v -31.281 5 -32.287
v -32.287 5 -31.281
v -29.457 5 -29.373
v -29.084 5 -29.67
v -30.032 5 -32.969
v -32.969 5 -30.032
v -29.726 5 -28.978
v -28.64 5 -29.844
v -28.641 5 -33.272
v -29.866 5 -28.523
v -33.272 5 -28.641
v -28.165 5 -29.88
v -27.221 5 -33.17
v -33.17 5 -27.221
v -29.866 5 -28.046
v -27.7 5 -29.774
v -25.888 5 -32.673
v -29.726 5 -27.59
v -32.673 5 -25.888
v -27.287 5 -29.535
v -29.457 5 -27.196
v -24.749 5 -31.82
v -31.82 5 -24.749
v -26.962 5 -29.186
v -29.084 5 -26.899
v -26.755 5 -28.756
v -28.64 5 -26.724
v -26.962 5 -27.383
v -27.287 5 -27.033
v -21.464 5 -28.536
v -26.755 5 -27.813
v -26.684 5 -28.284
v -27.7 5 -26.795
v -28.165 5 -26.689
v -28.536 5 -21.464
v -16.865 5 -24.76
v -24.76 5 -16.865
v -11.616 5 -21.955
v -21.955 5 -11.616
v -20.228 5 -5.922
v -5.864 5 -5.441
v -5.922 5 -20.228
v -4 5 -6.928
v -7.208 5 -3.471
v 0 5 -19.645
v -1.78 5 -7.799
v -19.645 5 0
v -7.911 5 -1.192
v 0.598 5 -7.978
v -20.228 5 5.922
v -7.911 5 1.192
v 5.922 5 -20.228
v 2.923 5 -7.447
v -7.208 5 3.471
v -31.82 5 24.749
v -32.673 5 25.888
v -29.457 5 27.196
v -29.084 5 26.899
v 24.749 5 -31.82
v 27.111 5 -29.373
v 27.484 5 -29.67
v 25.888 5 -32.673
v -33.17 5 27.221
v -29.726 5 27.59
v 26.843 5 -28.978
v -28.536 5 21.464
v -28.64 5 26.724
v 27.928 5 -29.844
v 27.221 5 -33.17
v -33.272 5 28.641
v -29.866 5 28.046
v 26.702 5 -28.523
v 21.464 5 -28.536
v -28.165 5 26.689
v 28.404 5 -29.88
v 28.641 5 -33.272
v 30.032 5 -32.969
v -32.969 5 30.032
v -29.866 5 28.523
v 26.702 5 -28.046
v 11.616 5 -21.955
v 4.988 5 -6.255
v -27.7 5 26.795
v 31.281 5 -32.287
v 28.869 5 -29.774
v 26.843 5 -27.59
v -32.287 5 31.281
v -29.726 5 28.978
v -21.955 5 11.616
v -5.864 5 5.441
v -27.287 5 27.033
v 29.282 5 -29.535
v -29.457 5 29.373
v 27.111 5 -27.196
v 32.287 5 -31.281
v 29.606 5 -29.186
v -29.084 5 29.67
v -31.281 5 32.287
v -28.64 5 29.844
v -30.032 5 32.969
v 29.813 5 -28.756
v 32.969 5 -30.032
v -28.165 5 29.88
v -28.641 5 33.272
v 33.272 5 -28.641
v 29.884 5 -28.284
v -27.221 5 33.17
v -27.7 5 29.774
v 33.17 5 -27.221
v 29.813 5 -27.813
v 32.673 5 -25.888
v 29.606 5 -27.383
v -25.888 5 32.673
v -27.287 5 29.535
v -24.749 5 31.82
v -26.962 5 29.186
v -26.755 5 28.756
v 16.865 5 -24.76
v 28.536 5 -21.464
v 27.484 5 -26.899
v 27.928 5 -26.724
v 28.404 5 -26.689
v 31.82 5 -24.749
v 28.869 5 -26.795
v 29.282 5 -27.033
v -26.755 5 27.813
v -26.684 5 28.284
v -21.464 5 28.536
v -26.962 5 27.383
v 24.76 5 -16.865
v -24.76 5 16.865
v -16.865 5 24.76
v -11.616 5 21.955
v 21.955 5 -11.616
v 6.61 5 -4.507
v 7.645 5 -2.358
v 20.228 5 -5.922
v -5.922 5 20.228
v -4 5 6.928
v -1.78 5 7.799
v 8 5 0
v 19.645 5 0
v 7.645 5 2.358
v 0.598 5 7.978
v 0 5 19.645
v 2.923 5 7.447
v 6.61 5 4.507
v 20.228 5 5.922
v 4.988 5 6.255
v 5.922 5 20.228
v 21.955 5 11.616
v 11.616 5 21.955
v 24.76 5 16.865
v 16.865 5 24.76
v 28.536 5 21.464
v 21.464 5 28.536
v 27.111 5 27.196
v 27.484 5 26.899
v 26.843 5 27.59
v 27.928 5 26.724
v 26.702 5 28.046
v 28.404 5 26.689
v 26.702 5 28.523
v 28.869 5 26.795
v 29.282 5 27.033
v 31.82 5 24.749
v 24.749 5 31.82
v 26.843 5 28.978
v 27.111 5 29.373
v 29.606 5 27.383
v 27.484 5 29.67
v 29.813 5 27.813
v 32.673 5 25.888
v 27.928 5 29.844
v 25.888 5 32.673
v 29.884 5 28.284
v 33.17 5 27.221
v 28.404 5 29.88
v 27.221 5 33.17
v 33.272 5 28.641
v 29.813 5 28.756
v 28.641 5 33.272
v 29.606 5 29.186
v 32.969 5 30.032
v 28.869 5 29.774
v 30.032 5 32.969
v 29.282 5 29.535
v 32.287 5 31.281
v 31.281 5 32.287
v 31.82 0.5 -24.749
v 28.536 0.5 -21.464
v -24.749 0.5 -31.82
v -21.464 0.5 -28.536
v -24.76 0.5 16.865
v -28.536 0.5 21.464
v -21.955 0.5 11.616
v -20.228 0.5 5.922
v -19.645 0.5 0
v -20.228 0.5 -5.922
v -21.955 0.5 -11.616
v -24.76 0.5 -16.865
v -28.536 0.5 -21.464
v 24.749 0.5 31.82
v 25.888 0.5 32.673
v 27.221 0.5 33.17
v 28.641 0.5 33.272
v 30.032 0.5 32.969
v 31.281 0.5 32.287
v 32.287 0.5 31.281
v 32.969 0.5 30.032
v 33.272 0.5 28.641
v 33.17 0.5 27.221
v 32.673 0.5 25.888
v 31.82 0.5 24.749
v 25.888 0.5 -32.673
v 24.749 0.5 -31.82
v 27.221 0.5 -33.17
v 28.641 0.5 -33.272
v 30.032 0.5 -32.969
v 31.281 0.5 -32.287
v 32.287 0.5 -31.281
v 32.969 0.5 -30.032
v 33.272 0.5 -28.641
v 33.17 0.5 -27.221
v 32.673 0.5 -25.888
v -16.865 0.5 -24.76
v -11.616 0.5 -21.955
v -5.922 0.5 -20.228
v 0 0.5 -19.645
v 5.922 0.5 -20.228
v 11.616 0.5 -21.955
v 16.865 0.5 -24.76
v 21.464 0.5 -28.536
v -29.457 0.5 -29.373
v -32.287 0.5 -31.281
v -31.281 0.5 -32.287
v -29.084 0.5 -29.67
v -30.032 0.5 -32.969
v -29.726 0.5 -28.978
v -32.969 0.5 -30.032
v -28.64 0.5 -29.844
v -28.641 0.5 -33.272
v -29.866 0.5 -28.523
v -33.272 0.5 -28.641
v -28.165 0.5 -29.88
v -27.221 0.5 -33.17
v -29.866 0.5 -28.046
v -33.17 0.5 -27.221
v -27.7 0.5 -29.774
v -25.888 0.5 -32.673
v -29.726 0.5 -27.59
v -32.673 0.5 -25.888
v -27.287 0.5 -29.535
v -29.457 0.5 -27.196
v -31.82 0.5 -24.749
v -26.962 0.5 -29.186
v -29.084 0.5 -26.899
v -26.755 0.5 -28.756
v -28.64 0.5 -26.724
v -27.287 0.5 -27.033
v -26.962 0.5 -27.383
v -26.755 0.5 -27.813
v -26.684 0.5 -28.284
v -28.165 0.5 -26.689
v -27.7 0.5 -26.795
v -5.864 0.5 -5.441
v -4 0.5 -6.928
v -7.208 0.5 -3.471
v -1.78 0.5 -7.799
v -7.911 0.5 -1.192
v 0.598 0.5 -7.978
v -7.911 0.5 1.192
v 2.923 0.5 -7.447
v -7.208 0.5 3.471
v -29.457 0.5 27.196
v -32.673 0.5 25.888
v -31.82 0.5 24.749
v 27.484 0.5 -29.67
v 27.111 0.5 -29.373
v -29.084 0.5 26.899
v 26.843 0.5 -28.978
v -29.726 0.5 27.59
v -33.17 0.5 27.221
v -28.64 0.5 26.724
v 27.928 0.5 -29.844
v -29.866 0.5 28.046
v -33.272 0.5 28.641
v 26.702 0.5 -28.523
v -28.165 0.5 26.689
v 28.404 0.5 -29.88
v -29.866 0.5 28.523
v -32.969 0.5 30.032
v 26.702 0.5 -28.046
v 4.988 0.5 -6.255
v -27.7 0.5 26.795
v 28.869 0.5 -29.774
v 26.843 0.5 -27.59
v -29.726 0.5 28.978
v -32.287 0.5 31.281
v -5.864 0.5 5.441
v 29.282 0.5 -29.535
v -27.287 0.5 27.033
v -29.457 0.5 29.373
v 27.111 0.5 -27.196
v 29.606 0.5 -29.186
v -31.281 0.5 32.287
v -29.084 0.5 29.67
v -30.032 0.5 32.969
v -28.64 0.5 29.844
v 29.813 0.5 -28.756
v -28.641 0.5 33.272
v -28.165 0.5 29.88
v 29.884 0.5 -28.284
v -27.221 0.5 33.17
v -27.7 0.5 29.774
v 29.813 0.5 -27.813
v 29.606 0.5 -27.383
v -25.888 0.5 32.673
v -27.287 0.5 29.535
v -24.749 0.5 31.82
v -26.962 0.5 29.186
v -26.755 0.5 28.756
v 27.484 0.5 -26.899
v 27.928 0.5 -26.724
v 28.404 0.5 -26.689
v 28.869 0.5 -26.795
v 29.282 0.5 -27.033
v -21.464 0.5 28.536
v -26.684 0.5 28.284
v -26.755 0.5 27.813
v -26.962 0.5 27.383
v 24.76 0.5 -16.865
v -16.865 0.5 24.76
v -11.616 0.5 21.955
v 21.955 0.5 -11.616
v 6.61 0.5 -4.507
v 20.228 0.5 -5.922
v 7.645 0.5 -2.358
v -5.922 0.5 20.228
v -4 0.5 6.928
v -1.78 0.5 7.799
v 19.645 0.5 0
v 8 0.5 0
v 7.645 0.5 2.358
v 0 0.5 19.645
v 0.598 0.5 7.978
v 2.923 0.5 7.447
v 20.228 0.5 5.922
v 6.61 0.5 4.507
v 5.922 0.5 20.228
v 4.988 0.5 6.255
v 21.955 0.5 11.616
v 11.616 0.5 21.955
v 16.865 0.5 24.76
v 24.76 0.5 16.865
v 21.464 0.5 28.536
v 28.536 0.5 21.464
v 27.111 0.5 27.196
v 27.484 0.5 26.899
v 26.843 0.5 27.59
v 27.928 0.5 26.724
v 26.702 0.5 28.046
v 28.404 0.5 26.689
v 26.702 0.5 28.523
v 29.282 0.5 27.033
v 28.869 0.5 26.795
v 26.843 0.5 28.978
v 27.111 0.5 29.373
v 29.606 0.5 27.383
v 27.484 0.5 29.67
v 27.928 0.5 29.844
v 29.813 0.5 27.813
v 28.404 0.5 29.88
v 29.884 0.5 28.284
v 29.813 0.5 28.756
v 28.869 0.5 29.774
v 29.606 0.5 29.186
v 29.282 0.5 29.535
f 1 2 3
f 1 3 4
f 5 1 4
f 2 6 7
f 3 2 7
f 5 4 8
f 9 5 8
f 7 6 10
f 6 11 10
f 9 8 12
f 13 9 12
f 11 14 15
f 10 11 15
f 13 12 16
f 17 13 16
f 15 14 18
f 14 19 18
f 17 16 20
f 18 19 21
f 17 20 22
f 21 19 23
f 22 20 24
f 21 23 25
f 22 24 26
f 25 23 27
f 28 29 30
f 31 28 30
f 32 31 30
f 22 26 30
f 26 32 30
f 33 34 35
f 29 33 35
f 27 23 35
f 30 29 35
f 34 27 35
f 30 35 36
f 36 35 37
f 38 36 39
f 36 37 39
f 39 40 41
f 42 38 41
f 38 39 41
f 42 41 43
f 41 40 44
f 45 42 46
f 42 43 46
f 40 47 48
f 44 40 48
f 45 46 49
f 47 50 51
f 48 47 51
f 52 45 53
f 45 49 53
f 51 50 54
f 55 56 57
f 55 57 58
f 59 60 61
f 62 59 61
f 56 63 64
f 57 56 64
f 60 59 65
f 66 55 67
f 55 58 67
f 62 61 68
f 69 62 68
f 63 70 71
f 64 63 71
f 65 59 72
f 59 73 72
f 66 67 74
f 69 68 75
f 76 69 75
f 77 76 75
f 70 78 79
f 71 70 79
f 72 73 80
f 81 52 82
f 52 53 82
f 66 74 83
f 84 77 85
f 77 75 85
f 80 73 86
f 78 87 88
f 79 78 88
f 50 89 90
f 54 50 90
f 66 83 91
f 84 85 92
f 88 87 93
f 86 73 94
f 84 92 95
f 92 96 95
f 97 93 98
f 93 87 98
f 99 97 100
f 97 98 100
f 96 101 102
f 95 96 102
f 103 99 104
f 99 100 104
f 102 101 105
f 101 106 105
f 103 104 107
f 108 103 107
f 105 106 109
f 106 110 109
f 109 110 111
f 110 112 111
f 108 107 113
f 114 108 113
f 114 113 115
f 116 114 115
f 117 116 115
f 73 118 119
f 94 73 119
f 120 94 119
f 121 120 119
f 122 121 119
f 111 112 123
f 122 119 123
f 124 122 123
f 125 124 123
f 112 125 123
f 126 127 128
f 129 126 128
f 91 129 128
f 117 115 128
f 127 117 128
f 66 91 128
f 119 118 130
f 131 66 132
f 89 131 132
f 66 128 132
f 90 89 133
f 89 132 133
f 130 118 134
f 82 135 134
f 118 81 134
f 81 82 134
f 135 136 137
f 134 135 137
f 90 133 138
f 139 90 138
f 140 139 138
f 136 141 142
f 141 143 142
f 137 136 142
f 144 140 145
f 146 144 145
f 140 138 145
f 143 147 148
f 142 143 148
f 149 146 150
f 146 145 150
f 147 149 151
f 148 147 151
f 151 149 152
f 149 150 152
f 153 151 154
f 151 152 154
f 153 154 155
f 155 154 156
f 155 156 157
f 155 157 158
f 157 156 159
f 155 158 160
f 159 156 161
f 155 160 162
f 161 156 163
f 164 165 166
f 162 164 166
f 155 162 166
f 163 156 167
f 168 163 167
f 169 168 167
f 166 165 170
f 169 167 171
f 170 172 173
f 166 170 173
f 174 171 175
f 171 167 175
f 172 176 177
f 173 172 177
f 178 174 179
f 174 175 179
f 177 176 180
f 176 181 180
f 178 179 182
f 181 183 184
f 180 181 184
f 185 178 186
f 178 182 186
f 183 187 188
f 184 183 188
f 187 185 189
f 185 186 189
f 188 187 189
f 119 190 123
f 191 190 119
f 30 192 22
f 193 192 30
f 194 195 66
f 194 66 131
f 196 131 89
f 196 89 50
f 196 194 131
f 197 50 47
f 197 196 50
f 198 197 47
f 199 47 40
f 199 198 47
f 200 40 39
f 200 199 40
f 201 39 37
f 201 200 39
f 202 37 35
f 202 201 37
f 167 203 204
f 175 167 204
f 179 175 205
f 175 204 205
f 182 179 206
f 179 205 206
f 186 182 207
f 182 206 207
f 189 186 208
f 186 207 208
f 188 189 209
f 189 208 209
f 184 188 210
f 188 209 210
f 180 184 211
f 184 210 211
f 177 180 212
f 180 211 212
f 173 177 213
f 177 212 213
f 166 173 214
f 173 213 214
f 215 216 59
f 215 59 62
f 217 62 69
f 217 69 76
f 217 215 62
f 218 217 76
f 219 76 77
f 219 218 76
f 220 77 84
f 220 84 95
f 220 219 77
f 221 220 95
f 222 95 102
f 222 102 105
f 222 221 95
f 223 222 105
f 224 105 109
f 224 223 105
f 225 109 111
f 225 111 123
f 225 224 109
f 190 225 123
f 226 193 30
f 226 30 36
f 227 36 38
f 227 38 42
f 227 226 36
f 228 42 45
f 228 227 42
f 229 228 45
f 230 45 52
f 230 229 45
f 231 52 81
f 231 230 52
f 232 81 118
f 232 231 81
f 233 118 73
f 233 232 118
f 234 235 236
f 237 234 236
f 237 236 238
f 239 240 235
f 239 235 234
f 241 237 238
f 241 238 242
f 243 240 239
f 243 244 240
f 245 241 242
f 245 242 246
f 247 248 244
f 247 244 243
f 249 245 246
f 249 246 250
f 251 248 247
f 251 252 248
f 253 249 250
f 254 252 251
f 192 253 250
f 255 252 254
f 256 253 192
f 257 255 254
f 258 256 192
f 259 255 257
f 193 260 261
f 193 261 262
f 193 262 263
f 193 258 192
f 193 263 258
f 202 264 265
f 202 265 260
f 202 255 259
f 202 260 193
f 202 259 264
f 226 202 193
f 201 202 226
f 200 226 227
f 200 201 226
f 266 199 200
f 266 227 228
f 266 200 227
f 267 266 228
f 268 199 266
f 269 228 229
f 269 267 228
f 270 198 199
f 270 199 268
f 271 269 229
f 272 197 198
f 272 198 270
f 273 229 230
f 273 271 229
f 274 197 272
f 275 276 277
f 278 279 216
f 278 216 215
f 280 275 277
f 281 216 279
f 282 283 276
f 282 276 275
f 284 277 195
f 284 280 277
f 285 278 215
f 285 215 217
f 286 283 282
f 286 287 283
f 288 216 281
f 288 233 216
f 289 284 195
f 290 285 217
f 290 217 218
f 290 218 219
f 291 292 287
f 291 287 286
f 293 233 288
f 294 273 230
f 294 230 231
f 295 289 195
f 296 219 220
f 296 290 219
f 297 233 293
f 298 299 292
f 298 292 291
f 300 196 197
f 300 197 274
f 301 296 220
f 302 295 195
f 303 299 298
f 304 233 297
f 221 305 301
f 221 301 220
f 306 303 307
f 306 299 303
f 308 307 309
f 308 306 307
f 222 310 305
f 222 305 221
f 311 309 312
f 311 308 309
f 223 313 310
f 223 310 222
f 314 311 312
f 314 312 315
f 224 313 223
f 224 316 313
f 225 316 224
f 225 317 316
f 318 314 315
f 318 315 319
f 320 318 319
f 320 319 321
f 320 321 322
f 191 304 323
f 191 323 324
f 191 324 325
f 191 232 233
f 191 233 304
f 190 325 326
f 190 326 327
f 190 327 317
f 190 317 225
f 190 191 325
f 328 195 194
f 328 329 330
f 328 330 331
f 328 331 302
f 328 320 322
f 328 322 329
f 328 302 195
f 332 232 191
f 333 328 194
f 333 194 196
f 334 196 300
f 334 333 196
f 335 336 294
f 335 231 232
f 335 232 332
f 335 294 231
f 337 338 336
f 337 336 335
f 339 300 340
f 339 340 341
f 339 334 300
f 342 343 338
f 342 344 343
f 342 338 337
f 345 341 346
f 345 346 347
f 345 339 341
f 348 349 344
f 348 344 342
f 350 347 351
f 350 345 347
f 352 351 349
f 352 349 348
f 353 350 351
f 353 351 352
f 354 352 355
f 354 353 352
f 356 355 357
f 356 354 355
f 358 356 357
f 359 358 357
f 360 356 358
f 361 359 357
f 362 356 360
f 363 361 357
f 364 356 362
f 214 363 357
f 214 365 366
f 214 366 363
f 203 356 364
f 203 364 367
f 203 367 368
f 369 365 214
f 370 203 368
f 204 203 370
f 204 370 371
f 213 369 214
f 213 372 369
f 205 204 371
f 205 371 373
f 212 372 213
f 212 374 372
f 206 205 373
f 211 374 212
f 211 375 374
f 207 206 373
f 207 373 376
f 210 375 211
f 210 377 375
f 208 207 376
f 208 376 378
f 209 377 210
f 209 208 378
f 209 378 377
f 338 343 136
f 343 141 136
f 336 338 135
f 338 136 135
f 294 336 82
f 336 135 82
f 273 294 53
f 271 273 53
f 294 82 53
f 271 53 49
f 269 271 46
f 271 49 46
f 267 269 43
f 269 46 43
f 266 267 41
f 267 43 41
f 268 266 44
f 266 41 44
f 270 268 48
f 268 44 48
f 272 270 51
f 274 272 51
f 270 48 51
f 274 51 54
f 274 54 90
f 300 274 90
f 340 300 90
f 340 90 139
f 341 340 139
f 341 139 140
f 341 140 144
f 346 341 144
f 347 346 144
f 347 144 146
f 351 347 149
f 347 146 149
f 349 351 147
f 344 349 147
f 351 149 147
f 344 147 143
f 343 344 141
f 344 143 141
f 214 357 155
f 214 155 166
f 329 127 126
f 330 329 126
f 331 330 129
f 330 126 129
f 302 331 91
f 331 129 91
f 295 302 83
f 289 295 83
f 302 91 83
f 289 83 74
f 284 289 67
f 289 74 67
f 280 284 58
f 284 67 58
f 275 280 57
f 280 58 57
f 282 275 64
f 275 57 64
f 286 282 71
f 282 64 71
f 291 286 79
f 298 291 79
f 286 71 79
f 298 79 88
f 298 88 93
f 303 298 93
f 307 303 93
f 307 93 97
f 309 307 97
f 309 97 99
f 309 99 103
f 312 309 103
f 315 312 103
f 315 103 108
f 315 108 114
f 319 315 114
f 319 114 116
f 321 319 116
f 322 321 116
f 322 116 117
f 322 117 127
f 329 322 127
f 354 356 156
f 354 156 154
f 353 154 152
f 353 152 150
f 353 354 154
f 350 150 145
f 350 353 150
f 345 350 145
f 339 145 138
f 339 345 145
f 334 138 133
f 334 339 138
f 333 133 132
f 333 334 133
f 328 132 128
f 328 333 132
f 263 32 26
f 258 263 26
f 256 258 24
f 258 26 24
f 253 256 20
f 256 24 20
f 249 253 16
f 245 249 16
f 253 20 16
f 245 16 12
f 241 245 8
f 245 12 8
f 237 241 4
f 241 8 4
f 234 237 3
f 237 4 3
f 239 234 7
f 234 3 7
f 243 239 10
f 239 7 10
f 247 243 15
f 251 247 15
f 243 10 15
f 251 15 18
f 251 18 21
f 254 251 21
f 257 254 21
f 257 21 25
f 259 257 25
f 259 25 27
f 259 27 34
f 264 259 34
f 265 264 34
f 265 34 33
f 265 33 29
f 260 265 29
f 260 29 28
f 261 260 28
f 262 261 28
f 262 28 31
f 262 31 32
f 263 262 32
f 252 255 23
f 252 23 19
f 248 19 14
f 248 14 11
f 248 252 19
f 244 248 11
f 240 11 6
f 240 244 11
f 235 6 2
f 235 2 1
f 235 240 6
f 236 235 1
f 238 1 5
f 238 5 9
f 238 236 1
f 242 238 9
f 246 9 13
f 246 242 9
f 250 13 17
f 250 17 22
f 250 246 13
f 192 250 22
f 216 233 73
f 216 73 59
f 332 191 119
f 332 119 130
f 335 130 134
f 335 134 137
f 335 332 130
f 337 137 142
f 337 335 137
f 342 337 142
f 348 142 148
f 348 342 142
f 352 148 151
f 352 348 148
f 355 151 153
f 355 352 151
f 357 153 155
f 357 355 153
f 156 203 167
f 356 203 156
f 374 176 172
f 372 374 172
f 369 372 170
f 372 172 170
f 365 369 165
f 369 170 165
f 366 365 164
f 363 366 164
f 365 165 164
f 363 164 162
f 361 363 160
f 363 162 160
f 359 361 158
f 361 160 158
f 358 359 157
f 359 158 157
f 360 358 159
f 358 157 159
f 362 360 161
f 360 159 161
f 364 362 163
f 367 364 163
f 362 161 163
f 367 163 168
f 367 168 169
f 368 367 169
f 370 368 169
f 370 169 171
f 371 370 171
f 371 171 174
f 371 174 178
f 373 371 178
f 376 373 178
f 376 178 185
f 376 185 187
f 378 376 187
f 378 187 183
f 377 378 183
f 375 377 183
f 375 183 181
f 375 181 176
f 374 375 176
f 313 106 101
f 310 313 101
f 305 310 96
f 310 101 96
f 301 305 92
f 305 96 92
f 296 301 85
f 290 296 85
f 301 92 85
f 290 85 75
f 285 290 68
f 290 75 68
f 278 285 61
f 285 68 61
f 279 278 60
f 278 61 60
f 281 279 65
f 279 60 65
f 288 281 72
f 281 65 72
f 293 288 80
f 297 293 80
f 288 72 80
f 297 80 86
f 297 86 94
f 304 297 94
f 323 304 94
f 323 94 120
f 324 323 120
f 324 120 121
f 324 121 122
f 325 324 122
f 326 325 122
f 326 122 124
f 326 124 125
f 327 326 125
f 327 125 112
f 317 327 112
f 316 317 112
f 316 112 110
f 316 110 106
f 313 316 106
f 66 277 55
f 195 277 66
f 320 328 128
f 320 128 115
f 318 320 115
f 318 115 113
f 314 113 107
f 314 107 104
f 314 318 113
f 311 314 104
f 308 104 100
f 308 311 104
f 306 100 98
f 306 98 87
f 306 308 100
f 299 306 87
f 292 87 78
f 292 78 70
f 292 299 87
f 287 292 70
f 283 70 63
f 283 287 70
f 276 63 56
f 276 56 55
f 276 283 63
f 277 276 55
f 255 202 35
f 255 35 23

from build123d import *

# Parameters (mm, degrees)
SKETCH_1_W          = 70
SKETCH_1_H          = 70
EXTRUDE_1_DEPTH     = 5
SKETCH_2_R          = 8
CUT_EXTRUDE_1_DEPTH = 2.5
CUT_EXTRUDE_2_REACH = 4.5
SKETCH_3_R          = 6.5
SKETCH_4_W          = 70
SKETCH_4_H          = 70
SKETCH_4_R          = 10
CUT_EXTRUDE_3_DEPTH = 0.5
CUT_EXTRUDE_4_REACH = 7
SKETCH_5_R          = 1.6
CUT_EXTRUDE_6_REACH = 6.5
CUT_EXTRUDE_7_REACH = 6.5
FILLET_1_R          = 10
SKETCH_8_R          = 10
CUT_EXTRUDE_8_DEPTH = 0.5
EXTRUDE_2_DEPTH     = 4.5
CUT_EXTRUDE_9_REACH = 4
SKETCH_10_R         = 8
SKETCH_10_R_2       = 6.5


with BuildPart() as part:
    # 草图1 → 凸台-拉伸1 (new body)
    with BuildSketch(Plane(origin=(0, 0, 0), x_dir=(1, 0, 0), z_dir=(0, 1, 0))):
        Rectangle(SKETCH_1_W, SKETCH_1_H)
    extrude(amount=EXTRUDE_1_DEPTH)

    # 草图2 → 切除-拉伸1 (cut)
    with BuildSketch(Plane(origin=(0, 5, 0), x_dir=(1, 0, 0), z_dir=(0, 1, 0))):
        Circle(SKETCH_2_R)
    extrude(amount=-CUT_EXTRUDE_1_DEPTH, mode=Mode.SUBTRACT)

    # 草图3 → 切除-拉伸2 (cut, up to next)
    with BuildSketch(Plane(origin=(0, 2.5, 0), x_dir=(1, 0, 0), z_dir=(0, 1, 0)), mode=Mode.PRIVATE) as cut_extrude_2_sk1:
        Circle(SKETCH_3_R)
    cut_extrude_2_tool1 = extrude(cut_extrude_2_sk1.sketch, amount=-CUT_EXTRUDE_2_REACH, mode=Mode.PRIVATE) & part.part
    add(cut_extrude_2_tool1.solids().sort_by_distance((0, 2.5, 0))[0], mode=Mode.SUBTRACT)

    # 草图4 → 切除-拉伸3 (cut)
    with BuildSketch(Plane.XZ):
        Rectangle(SKETCH_4_W, SKETCH_4_H)
        Circle(SKETCH_4_R, mode=Mode.SUBTRACT)
    extrude(amount=-CUT_EXTRUDE_3_DEPTH, mode=Mode.SUBTRACT)

    # 草图5 → 切除-拉伸4 (cut, up to next)
    with BuildSketch(Plane(origin=(0, 5, 0), x_dir=(1, 0, 0), z_dir=(0, 1, 0)), mode=Mode.PRIVATE) as cut_extrude_4_sk1:
        with Locations((28.284271247, -28.284271247)):
            Circle(SKETCH_5_R)
    cut_extrude_4_tool1 = extrude(cut_extrude_4_sk1.sketch, amount=-CUT_EXTRUDE_4_REACH, mode=Mode.PRIVATE) & part.part
    add(cut_extrude_4_tool1.solids().sort_by_distance((28.284271, 5, 28.284271))[0], mode=Mode.SUBTRACT)
    # 草图5 → 切除-拉伸4 (cut, up to next)
    with BuildSketch(Plane(origin=(0, 5, 0), x_dir=(1, 0, 0), z_dir=(0, 1, 0)), mode=Mode.PRIVATE) as cut_extrude_4_sk2:
        with Locations((-28.284271247, -28.284271247)):
            Circle(SKETCH_5_R)
    cut_extrude_4_tool2 = extrude(cut_extrude_4_sk2.sketch, amount=-CUT_EXTRUDE_4_REACH, mode=Mode.PRIVATE) & part.part
    add(cut_extrude_4_tool2.solids().sort_by_distance((-28.284271, 5, 28.284271))[0], mode=Mode.SUBTRACT)
    # 草图5 → 切除-拉伸4 (cut, up to next)
    with BuildSketch(Plane(origin=(0, 5, 0), x_dir=(1, 0, 0), z_dir=(0, 1, 0)), mode=Mode.PRIVATE) as cut_extrude_4_sk3:
        with Locations((-28.284271247, 28.284271247)):
            Circle(SKETCH_5_R)
    cut_extrude_4_tool3 = extrude(cut_extrude_4_sk3.sketch, amount=-CUT_EXTRUDE_4_REACH, mode=Mode.PRIVATE) & part.part
    add(cut_extrude_4_tool3.solids().sort_by_distance((-28.284271, 5, -28.284271))[0], mode=Mode.SUBTRACT)
    # 草图5 → 切除-拉伸4 (cut, up to next)
    with BuildSketch(Plane(origin=(0, 5, 0), x_dir=(1, 0, 0), z_dir=(0, 1, 0)), mode=Mode.PRIVATE) as cut_extrude_4_sk4:
        with Locations((28.284271247, 28.284271247)):
            Circle(SKETCH_5_R)
    cut_extrude_4_tool4 = extrude(cut_extrude_4_sk4.sketch, amount=-CUT_EXTRUDE_4_REACH, mode=Mode.PRIVATE) & part.part
    add(cut_extrude_4_tool4.solids().sort_by_distance((28.284271, 5, -28.284271))[0], mode=Mode.SUBTRACT)

    # 草图6 → 切除-拉伸6 (cut, up to next)
    with BuildSketch(Plane.XZ.offset(-0.5), mode=Mode.PRIVATE) as cut_extrude_6_sk1:
        with BuildLine():
            Line((27.928932188, 35), (4.565391967, 11.636459779))
            ThreePointArc((4.565391967, 11.636459779), (0, 12.5), (-4.565391967, 11.636459779))
            Line((-4.565391967, 11.636459779), (-27.928932188, 35))
            Line((-27.928932188, 35), (27.928932188, 35))
        make_face()
    cut_extrude_6_tool1 = extrude(cut_extrude_6_sk1.sketch, amount=-CUT_EXTRUDE_6_REACH, mode=Mode.PRIVATE) & part.part
    add(cut_extrude_6_tool1.solids().sort_by_distance((0, 0.5, 26.217235))[0], mode=Mode.SUBTRACT)
    # 草图6 → 切除-拉伸6 (cut, up to next)
    with BuildSketch(Plane.XZ.offset(-0.5), mode=Mode.PRIVATE) as cut_extrude_6_sk2:
        with BuildLine():
            Line((35, -27.928932188), (11.636459779, -4.565391967))
            ThreePointArc((11.636459779, -4.565391967), (12.5, 0), (11.636459779, 4.565391967))
            Line((11.636459779, 4.565391967), (35, 27.928932188))
            Line((35, 27.928932188), (35, -27.928932188))
        make_face()
    cut_extrude_6_tool2 = extrude(cut_extrude_6_sk2.sketch, amount=-CUT_EXTRUDE_6_REACH, mode=Mode.PRIVATE) & part.part
    add(cut_extrude_6_tool2.solids().sort_by_distance((26.217235, 0.5, 0))[0], mode=Mode.SUBTRACT)
    # 草图6 → 切除-拉伸6 (cut, up to next)
    with BuildSketch(Plane.XZ.offset(-0.5), mode=Mode.PRIVATE) as cut_extrude_6_sk3:
        with BuildLine():
            Line((-27.928932188, -35), (-4.565391967, -11.636459779))
            ThreePointArc((-4.565391967, -11.636459779), (0, -12.5), (4.565391967, -11.636459779))
            Line((4.565391967, -11.636459779), (27.928932188, -35))
            Line((27.928932188, -35), (-27.928932188, -35))
        make_face()
    cut_extrude_6_tool3 = extrude(cut_extrude_6_sk3.sketch, amount=-CUT_EXTRUDE_6_REACH, mode=Mode.PRIVATE) & part.part
    add(cut_extrude_6_tool3.solids().sort_by_distance((0, 0.5, -26.217235))[0], mode=Mode.SUBTRACT)
    # 草图6 → 切除-拉伸6 (cut, up to next)
    with BuildSketch(Plane.XZ.offset(-0.5), mode=Mode.PRIVATE) as cut_extrude_6_sk4:
        with BuildLine():
            Line((-35, 27.928932188), (-11.636459779, 4.565391967))
            ThreePointArc((-11.636459779, 4.565391967), (-12.5, 0), (-11.636459779, -4.565391967))
            Line((-11.636459779, -4.565391967), (-35, -27.928932188))
            Line((-35, -27.928932188), (-35, 27.928932188))
        make_face()
    cut_extrude_6_tool4 = extrude(cut_extrude_6_sk4.sketch, amount=-CUT_EXTRUDE_6_REACH, mode=Mode.PRIVATE) & part.part
    add(cut_extrude_6_tool4.solids().sort_by_distance((-26.217235, 0.5, 0))[0], mode=Mode.SUBTRACT)

    # 草图7 → 切除-拉伸7 (cut, up to next)
    with BuildSketch(Plane.XZ.offset(-0.5), mode=Mode.PRIVATE) as cut_extrude_7_sk1:
        with BuildLine():
            Line((35, 27.928932188), (35, 35))
            Line((35, 35), (27.928932188, 35))
            Line((27.928932188, 35), (24.748737342, 31.819805153))
            ThreePointArc((24.748737342, 31.819805153), (31.819805153, 31.819805153), (31.819805153, 24.748737342))
            Line((31.819805153, 24.748737342), (35, 27.928932188))
        make_face()
    cut_extrude_7_tool1 = extrude(cut_extrude_7_sk1.sketch, amount=-CUT_EXTRUDE_7_REACH, mode=Mode.PRIVATE) & part.part
    add(cut_extrude_7_tool1.solids().sort_by_distance((32.243136, 0.5, 32.243136))[0], mode=Mode.SUBTRACT)
    # 草图7 → 切除-拉伸7 (cut, up to next)
    with BuildSketch(Plane.XZ.offset(-0.5), mode=Mode.PRIVATE) as cut_extrude_7_sk2:
        with BuildLine():
            Line((27.928932188, -35), (24.748737342, -31.819805153))
            ThreePointArc((24.748737342, -31.819805153), (31.819805153, -31.819805153), (31.819805153, -24.748737342))
            Line((31.819805153, -24.748737342), (35, -27.928932188))
            Line((35, -27.928932188), (35, -35))
            Line((35, -35), (27.928932188, -35))
        make_face()
    cut_extrude_7_tool2 = extrude(cut_extrude_7_sk2.sketch, amount=-CUT_EXTRUDE_7_REACH, mode=Mode.PRIVATE) & part.part
    add(cut_extrude_7_tool2.solids().sort_by_distance((32.243136, 0.5, -32.243136))[0], mode=Mode.SUBTRACT)
    # 草图7 → 切除-拉伸7 (cut, up to next)
    with BuildSketch(Plane.XZ.offset(-0.5), mode=Mode.PRIVATE) as cut_extrude_7_sk3:
        with BuildLine():
            Line((-35, -27.928932188), (-31.819805153, -24.748737342))
            ThreePointArc((-31.819805153, -24.748737342), (-31.819805153, -31.819805153), (-24.748737342, -31.819805153))
            Line((-24.748737342, -31.819805153), (-27.928932188, -35))
            Line((-27.928932188, -35), (-35, -35))
            Line((-35, -35), (-35, -27.928932188))
        make_face()
    cut_extrude_7_tool3 = extrude(cut_extrude_7_sk3.sketch, amount=-CUT_EXTRUDE_7_REACH, mode=Mode.PRIVATE) & part.part
    add(cut_extrude_7_tool3.solids().sort_by_distance((-32.243136, 0.5, -32.243136))[0], mode=Mode.SUBTRACT)
    # 草图7 → 切除-拉伸7 (cut, up to next)
    with BuildSketch(Plane.XZ.offset(-0.5), mode=Mode.PRIVATE) as cut_extrude_7_sk4:
        with BuildLine():
            Line((-27.928932188, 35), (-24.748737342, 31.819805153))
            ThreePointArc((-24.748737342, 31.819805153), (-31.819805153, 31.819805153), (-31.819805153, 24.748737342))
            Line((-31.819805153, 24.748737342), (-35, 27.928932188))
            Line((-35, 27.928932188), (-35, 35))
            Line((-35, 35), (-27.928932188, 35))
        make_face()
    cut_extrude_7_tool4 = extrude(cut_extrude_7_sk4.sketch, amount=-CUT_EXTRUDE_7_REACH, mode=Mode.PRIVATE) & part.part
    add(cut_extrude_7_tool4.solids().sort_by_distance((-32.243136, 0.5, 32.243136))[0], mode=Mode.SUBTRACT)

    # 圆角1
    fillet_1_edges = [part.edges().sort_by_distance(p)[0] for p in [
        (4.565391967, 2.75, 11.636459779),
        (-4.565391967, 2.75, 11.636459779),
        (11.636459779, 2.75, -4.565391967),
        (11.636459779, 2.75, 4.565391967),
        (-4.565391967, 2.75, -11.636459779),
        (4.565391967, 2.75, -11.636459779),
        (-11.636459779, 2.75, 4.565391967),
        (-11.636459779, 2.75, -4.565391967),
    ]]
    fillet(fillet_1_edges, radius=FILLET_1_R)

    # 草图8 → 切除-拉伸8 (cut)
    with BuildSketch(Plane.XZ):
        Circle(SKETCH_8_R)
    extrude(amount=-CUT_EXTRUDE_8_DEPTH, mode=Mode.SUBTRACT)

    # 草图9 → 凸台-拉伸2 (add)
    with BuildSketch(Plane.XZ.offset(-0.5)):
        with BuildLine():
            Line((8.32300732, 15.394075132), (21.464466094, 28.535533906))
            ThreePointArc((21.464466094, 28.535533906), (0, 19.644660941), (-21.464466094, 28.535533906))
            Line((-21.464466094, 28.535533906), (-8.32300732, 15.394075132))
            ThreePointArc((-8.32300732, 15.394075132), (-4.820160406, 13.123419354), (-0.695521949, 12.480634969))
            ThreePointArc((-0.695521949, 12.480634969), (0, 12.5), (0.695521949, 12.480634969))
            ThreePointArc((0.695521949, 12.480634969), (4.820160406, 13.123419354), (8.32300732, 15.394075132))
        make_face()
        with BuildLine():
            Line((28.535533906, 21.464466094), (15.394075132, 8.32300732))
            ThreePointArc((15.394075132, 8.32300732), (13.123419354, 4.820160406), (12.480634969, 0.695521949))
            ThreePointArc((12.480634969, 0.695521949), (12.5, 0), (12.480634969, -0.695521949))
            ThreePointArc((12.480634969, -0.695521949), (13.123419354, -4.820160406), (15.394075132, -8.32300732))
            Line((15.394075132, -8.32300732), (28.535533906, -21.464466094))
            ThreePointArc((28.535533906, -21.464466094), (19.644660941, 0), (28.535533906, 21.464466094))
        make_face()
        with BuildLine():
            Line((21.464466094, -28.535533906), (8.32300732, -15.394075132))
            ThreePointArc((8.32300732, -15.394075132), (4.820160406, -13.123419354), (0.695521949, -12.480634969))
            ThreePointArc((0.695521949, -12.480634969), (0, -12.5), (-0.695521949, -12.480634969))
            ThreePointArc((-0.695521949, -12.480634969), (-4.820160406, -13.123419354), (-8.32300732, -15.394075132))
            Line((-8.32300732, -15.394075132), (-21.464466094, -28.535533906))
            ThreePointArc((-21.464466094, -28.535533906), (0, -19.644660941), (21.464466094, -28.535533906))
        make_face()
        with BuildLine():
            Line((-28.535533906, -21.464466094), (-15.394075132, -8.32300732))
            ThreePointArc((-15.394075132, -8.32300732), (-13.123419354, -4.820160406), (-12.480634969, -0.695521949))
            ThreePointArc((-12.480634969, -0.695521949), (-12.5, 0), (-12.480634969, 0.695521949))
            ThreePointArc((-12.480634969, 0.695521949), (-13.123419354, 4.820160406), (-15.394075132, 8.32300732))
            Line((-15.394075132, 8.32300732), (-28.535533906, 21.464466094))
            ThreePointArc((-28.535533906, 21.464466094), (-19.644660941, 0), (-28.535533906, -21.464466094))
        make_face()
    extrude(amount=-EXTRUDE_2_DEPTH)

    # 草图10 → 切除-拉伸9 (cut, up to next)
    with BuildSketch(Plane(origin=(0, 2.5, 0), x_dir=(1, 0, 0), z_dir=(0, 1, 0)), mode=Mode.PRIVATE) as cut_extrude_9_sk1:
        Circle(SKETCH_10_R)
        Circle(SKETCH_10_R_2, mode=Mode.SUBTRACT)
    cut_extrude_9_tool1 = extrude(cut_extrude_9_sk1.sketch, amount=-CUT_EXTRUDE_9_REACH, mode=Mode.PRIVATE) & part.part
    add(cut_extrude_9_tool1.solids().sort_by_distance((-7.773726, 2.5, 0))[0], mode=Mode.SUBTRACT)


solid = part.part
